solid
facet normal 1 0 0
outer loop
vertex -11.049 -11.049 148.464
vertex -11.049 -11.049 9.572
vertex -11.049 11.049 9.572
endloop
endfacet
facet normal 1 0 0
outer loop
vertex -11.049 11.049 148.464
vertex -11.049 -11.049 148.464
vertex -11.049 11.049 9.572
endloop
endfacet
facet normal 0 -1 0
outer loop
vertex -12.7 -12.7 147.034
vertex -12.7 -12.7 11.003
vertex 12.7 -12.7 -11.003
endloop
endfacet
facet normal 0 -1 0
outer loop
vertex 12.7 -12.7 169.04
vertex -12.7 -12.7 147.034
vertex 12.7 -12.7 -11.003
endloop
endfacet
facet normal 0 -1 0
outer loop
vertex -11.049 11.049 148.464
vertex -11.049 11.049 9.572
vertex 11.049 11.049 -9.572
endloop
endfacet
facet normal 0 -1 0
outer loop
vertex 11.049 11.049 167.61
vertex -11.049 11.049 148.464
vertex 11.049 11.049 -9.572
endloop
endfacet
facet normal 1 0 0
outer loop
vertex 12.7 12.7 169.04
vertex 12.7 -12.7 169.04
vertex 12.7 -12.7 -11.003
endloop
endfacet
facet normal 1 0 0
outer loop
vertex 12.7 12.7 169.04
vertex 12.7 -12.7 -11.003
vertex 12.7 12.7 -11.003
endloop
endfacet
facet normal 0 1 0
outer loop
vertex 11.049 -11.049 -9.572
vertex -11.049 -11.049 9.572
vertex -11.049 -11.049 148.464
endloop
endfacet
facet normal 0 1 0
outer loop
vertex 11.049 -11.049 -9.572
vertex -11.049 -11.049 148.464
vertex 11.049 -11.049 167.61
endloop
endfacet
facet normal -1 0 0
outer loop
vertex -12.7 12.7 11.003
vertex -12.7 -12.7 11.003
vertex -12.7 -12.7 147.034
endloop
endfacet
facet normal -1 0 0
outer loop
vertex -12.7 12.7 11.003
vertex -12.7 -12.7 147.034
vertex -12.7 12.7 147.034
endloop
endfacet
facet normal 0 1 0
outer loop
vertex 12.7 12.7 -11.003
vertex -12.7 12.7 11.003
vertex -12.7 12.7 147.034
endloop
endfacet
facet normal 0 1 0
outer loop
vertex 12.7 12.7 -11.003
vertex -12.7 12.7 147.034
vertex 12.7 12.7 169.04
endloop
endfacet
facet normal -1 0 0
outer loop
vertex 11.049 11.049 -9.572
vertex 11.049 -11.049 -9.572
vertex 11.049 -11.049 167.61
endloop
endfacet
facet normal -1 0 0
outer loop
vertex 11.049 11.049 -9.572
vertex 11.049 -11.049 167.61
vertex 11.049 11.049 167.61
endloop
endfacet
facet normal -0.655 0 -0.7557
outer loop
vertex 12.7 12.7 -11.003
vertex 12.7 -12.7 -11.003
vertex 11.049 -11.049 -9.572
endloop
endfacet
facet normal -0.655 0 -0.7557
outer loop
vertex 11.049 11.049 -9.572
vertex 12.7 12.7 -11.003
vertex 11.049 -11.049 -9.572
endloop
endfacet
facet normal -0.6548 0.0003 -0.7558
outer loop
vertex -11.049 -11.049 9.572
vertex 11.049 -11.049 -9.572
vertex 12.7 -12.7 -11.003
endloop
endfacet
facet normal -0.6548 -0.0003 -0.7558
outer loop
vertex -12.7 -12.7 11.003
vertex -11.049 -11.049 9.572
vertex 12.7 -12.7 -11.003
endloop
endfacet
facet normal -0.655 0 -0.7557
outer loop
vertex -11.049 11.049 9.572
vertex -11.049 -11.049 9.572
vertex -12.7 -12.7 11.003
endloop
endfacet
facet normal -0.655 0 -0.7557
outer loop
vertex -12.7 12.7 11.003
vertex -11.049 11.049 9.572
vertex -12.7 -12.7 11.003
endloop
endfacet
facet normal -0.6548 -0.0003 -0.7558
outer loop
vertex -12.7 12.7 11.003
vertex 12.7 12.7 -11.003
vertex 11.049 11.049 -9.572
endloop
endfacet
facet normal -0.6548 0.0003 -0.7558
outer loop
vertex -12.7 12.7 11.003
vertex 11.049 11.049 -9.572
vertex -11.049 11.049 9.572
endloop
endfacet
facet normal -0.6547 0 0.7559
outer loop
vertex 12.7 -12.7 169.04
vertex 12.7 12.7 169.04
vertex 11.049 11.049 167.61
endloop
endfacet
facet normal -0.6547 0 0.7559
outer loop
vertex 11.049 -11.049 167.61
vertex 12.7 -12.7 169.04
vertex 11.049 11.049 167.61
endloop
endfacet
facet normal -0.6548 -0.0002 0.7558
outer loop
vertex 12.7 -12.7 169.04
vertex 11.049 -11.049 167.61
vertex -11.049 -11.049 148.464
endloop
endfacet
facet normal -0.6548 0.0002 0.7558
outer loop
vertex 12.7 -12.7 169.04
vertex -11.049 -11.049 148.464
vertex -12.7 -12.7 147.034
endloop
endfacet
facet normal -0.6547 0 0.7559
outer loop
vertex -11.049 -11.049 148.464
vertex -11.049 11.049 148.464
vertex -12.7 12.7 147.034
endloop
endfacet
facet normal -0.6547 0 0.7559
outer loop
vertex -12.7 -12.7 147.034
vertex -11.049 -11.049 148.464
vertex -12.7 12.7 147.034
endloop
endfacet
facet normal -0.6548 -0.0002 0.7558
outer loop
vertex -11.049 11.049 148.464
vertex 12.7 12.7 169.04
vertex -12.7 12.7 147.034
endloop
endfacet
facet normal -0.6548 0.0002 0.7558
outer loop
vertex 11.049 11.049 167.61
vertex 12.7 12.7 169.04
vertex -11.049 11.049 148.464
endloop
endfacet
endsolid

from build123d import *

# Parameters (mm, degrees)
SKETCH1_W           = 25.4
SKETCH1_H           = 25.4
SKETCH1_W_2         = 22.098
SKETCH1_H_2         = 22.098
BOSS_EXTRUDE1_DEPTH = 158.03712
SKETCH7_W           = 25.4
SKETCH7_H           = 25.4
SKETCH7_W_2         = 22.098
SKETCH7_H_2         = 22.098
BOSS_EXTRUDE2_DEPTH = 12.7
CUT_EXTRUDE1_DEPTH  = 36.4
SKETCH9_W           = 25.4
SKETCH9_H           = 25.4
SKETCH9_W_2         = 22.098
SKETCH9_H_2         = 22.098
BOSS_EXTRUDE3_DEPTH = 25.4
CUT_EXTRUDE2_DEPTH  = 36.4


with BuildPart() as part:
    # Sketch1 → Boss-Extrude1 (new body)
    with BuildSketch(Plane.XY):
        Rectangle(SKETCH1_W, SKETCH1_H)
        Rectangle(SKETCH1_W_2, SKETCH1_H_2, mode=Mode.SUBTRACT)
    extrude(amount=BOSS_EXTRUDE1_DEPTH)

    # Sketch7 → Boss-Extrude2 (add)
    with BuildSketch(Plane(origin=(0, 0, 0), x_dir=(-1, 0, 0), z_dir=(0, 0, -1))):
        Rectangle(SKETCH7_W, SKETCH7_H)
        Rectangle(SKETCH7_W_2, SKETCH7_H_2, mode=Mode.SUBTRACT)
    extrude(amount=BOSS_EXTRUDE2_DEPTH)

    # Sketch8 → Cut-Extrude1 (cut, through all)
    with BuildSketch(Plane(origin=(0, 22.7, 0), x_dir=(1, 0, 0), z_dir=(0, 1, 0))):
        Polygon((42.140856973, 36.508313653), (-34.628433436, -30), (-56.571600074, 82.773791124), align=None)
    extrude(amount=-CUT_EXTRUDE1_DEPTH, mode=Mode.SUBTRACT)

    # Sketch9 → Boss-Extrude3 (add)
    with BuildSketch(Plane.XY.offset(158.037119512)):
        Rectangle(SKETCH9_W, SKETCH9_H)
        Rectangle(SKETCH9_W_2, SKETCH9_H_2, mode=Mode.SUBTRACT)
    extrude(amount=BOSS_EXTRUDE3_DEPTH)

    # Sketch11 → Cut-Extrude2 (cut, through all)
    with BuildSketch(Plane(origin=(-388.03129279, 22.7, 553.337933672), x_dir=(-1, 0, 0), z_dir=(0, 1, 0))):
        Polygon((-356.047433406, -423.010988055), (-328.054453058, -334.045248583), (-413.969286498, -372.828656955), align=None)
    extrude(amount=-CUT_EXTRUDE2_DEPTH, mode=Mode.SUBTRACT)


solid = part.part
